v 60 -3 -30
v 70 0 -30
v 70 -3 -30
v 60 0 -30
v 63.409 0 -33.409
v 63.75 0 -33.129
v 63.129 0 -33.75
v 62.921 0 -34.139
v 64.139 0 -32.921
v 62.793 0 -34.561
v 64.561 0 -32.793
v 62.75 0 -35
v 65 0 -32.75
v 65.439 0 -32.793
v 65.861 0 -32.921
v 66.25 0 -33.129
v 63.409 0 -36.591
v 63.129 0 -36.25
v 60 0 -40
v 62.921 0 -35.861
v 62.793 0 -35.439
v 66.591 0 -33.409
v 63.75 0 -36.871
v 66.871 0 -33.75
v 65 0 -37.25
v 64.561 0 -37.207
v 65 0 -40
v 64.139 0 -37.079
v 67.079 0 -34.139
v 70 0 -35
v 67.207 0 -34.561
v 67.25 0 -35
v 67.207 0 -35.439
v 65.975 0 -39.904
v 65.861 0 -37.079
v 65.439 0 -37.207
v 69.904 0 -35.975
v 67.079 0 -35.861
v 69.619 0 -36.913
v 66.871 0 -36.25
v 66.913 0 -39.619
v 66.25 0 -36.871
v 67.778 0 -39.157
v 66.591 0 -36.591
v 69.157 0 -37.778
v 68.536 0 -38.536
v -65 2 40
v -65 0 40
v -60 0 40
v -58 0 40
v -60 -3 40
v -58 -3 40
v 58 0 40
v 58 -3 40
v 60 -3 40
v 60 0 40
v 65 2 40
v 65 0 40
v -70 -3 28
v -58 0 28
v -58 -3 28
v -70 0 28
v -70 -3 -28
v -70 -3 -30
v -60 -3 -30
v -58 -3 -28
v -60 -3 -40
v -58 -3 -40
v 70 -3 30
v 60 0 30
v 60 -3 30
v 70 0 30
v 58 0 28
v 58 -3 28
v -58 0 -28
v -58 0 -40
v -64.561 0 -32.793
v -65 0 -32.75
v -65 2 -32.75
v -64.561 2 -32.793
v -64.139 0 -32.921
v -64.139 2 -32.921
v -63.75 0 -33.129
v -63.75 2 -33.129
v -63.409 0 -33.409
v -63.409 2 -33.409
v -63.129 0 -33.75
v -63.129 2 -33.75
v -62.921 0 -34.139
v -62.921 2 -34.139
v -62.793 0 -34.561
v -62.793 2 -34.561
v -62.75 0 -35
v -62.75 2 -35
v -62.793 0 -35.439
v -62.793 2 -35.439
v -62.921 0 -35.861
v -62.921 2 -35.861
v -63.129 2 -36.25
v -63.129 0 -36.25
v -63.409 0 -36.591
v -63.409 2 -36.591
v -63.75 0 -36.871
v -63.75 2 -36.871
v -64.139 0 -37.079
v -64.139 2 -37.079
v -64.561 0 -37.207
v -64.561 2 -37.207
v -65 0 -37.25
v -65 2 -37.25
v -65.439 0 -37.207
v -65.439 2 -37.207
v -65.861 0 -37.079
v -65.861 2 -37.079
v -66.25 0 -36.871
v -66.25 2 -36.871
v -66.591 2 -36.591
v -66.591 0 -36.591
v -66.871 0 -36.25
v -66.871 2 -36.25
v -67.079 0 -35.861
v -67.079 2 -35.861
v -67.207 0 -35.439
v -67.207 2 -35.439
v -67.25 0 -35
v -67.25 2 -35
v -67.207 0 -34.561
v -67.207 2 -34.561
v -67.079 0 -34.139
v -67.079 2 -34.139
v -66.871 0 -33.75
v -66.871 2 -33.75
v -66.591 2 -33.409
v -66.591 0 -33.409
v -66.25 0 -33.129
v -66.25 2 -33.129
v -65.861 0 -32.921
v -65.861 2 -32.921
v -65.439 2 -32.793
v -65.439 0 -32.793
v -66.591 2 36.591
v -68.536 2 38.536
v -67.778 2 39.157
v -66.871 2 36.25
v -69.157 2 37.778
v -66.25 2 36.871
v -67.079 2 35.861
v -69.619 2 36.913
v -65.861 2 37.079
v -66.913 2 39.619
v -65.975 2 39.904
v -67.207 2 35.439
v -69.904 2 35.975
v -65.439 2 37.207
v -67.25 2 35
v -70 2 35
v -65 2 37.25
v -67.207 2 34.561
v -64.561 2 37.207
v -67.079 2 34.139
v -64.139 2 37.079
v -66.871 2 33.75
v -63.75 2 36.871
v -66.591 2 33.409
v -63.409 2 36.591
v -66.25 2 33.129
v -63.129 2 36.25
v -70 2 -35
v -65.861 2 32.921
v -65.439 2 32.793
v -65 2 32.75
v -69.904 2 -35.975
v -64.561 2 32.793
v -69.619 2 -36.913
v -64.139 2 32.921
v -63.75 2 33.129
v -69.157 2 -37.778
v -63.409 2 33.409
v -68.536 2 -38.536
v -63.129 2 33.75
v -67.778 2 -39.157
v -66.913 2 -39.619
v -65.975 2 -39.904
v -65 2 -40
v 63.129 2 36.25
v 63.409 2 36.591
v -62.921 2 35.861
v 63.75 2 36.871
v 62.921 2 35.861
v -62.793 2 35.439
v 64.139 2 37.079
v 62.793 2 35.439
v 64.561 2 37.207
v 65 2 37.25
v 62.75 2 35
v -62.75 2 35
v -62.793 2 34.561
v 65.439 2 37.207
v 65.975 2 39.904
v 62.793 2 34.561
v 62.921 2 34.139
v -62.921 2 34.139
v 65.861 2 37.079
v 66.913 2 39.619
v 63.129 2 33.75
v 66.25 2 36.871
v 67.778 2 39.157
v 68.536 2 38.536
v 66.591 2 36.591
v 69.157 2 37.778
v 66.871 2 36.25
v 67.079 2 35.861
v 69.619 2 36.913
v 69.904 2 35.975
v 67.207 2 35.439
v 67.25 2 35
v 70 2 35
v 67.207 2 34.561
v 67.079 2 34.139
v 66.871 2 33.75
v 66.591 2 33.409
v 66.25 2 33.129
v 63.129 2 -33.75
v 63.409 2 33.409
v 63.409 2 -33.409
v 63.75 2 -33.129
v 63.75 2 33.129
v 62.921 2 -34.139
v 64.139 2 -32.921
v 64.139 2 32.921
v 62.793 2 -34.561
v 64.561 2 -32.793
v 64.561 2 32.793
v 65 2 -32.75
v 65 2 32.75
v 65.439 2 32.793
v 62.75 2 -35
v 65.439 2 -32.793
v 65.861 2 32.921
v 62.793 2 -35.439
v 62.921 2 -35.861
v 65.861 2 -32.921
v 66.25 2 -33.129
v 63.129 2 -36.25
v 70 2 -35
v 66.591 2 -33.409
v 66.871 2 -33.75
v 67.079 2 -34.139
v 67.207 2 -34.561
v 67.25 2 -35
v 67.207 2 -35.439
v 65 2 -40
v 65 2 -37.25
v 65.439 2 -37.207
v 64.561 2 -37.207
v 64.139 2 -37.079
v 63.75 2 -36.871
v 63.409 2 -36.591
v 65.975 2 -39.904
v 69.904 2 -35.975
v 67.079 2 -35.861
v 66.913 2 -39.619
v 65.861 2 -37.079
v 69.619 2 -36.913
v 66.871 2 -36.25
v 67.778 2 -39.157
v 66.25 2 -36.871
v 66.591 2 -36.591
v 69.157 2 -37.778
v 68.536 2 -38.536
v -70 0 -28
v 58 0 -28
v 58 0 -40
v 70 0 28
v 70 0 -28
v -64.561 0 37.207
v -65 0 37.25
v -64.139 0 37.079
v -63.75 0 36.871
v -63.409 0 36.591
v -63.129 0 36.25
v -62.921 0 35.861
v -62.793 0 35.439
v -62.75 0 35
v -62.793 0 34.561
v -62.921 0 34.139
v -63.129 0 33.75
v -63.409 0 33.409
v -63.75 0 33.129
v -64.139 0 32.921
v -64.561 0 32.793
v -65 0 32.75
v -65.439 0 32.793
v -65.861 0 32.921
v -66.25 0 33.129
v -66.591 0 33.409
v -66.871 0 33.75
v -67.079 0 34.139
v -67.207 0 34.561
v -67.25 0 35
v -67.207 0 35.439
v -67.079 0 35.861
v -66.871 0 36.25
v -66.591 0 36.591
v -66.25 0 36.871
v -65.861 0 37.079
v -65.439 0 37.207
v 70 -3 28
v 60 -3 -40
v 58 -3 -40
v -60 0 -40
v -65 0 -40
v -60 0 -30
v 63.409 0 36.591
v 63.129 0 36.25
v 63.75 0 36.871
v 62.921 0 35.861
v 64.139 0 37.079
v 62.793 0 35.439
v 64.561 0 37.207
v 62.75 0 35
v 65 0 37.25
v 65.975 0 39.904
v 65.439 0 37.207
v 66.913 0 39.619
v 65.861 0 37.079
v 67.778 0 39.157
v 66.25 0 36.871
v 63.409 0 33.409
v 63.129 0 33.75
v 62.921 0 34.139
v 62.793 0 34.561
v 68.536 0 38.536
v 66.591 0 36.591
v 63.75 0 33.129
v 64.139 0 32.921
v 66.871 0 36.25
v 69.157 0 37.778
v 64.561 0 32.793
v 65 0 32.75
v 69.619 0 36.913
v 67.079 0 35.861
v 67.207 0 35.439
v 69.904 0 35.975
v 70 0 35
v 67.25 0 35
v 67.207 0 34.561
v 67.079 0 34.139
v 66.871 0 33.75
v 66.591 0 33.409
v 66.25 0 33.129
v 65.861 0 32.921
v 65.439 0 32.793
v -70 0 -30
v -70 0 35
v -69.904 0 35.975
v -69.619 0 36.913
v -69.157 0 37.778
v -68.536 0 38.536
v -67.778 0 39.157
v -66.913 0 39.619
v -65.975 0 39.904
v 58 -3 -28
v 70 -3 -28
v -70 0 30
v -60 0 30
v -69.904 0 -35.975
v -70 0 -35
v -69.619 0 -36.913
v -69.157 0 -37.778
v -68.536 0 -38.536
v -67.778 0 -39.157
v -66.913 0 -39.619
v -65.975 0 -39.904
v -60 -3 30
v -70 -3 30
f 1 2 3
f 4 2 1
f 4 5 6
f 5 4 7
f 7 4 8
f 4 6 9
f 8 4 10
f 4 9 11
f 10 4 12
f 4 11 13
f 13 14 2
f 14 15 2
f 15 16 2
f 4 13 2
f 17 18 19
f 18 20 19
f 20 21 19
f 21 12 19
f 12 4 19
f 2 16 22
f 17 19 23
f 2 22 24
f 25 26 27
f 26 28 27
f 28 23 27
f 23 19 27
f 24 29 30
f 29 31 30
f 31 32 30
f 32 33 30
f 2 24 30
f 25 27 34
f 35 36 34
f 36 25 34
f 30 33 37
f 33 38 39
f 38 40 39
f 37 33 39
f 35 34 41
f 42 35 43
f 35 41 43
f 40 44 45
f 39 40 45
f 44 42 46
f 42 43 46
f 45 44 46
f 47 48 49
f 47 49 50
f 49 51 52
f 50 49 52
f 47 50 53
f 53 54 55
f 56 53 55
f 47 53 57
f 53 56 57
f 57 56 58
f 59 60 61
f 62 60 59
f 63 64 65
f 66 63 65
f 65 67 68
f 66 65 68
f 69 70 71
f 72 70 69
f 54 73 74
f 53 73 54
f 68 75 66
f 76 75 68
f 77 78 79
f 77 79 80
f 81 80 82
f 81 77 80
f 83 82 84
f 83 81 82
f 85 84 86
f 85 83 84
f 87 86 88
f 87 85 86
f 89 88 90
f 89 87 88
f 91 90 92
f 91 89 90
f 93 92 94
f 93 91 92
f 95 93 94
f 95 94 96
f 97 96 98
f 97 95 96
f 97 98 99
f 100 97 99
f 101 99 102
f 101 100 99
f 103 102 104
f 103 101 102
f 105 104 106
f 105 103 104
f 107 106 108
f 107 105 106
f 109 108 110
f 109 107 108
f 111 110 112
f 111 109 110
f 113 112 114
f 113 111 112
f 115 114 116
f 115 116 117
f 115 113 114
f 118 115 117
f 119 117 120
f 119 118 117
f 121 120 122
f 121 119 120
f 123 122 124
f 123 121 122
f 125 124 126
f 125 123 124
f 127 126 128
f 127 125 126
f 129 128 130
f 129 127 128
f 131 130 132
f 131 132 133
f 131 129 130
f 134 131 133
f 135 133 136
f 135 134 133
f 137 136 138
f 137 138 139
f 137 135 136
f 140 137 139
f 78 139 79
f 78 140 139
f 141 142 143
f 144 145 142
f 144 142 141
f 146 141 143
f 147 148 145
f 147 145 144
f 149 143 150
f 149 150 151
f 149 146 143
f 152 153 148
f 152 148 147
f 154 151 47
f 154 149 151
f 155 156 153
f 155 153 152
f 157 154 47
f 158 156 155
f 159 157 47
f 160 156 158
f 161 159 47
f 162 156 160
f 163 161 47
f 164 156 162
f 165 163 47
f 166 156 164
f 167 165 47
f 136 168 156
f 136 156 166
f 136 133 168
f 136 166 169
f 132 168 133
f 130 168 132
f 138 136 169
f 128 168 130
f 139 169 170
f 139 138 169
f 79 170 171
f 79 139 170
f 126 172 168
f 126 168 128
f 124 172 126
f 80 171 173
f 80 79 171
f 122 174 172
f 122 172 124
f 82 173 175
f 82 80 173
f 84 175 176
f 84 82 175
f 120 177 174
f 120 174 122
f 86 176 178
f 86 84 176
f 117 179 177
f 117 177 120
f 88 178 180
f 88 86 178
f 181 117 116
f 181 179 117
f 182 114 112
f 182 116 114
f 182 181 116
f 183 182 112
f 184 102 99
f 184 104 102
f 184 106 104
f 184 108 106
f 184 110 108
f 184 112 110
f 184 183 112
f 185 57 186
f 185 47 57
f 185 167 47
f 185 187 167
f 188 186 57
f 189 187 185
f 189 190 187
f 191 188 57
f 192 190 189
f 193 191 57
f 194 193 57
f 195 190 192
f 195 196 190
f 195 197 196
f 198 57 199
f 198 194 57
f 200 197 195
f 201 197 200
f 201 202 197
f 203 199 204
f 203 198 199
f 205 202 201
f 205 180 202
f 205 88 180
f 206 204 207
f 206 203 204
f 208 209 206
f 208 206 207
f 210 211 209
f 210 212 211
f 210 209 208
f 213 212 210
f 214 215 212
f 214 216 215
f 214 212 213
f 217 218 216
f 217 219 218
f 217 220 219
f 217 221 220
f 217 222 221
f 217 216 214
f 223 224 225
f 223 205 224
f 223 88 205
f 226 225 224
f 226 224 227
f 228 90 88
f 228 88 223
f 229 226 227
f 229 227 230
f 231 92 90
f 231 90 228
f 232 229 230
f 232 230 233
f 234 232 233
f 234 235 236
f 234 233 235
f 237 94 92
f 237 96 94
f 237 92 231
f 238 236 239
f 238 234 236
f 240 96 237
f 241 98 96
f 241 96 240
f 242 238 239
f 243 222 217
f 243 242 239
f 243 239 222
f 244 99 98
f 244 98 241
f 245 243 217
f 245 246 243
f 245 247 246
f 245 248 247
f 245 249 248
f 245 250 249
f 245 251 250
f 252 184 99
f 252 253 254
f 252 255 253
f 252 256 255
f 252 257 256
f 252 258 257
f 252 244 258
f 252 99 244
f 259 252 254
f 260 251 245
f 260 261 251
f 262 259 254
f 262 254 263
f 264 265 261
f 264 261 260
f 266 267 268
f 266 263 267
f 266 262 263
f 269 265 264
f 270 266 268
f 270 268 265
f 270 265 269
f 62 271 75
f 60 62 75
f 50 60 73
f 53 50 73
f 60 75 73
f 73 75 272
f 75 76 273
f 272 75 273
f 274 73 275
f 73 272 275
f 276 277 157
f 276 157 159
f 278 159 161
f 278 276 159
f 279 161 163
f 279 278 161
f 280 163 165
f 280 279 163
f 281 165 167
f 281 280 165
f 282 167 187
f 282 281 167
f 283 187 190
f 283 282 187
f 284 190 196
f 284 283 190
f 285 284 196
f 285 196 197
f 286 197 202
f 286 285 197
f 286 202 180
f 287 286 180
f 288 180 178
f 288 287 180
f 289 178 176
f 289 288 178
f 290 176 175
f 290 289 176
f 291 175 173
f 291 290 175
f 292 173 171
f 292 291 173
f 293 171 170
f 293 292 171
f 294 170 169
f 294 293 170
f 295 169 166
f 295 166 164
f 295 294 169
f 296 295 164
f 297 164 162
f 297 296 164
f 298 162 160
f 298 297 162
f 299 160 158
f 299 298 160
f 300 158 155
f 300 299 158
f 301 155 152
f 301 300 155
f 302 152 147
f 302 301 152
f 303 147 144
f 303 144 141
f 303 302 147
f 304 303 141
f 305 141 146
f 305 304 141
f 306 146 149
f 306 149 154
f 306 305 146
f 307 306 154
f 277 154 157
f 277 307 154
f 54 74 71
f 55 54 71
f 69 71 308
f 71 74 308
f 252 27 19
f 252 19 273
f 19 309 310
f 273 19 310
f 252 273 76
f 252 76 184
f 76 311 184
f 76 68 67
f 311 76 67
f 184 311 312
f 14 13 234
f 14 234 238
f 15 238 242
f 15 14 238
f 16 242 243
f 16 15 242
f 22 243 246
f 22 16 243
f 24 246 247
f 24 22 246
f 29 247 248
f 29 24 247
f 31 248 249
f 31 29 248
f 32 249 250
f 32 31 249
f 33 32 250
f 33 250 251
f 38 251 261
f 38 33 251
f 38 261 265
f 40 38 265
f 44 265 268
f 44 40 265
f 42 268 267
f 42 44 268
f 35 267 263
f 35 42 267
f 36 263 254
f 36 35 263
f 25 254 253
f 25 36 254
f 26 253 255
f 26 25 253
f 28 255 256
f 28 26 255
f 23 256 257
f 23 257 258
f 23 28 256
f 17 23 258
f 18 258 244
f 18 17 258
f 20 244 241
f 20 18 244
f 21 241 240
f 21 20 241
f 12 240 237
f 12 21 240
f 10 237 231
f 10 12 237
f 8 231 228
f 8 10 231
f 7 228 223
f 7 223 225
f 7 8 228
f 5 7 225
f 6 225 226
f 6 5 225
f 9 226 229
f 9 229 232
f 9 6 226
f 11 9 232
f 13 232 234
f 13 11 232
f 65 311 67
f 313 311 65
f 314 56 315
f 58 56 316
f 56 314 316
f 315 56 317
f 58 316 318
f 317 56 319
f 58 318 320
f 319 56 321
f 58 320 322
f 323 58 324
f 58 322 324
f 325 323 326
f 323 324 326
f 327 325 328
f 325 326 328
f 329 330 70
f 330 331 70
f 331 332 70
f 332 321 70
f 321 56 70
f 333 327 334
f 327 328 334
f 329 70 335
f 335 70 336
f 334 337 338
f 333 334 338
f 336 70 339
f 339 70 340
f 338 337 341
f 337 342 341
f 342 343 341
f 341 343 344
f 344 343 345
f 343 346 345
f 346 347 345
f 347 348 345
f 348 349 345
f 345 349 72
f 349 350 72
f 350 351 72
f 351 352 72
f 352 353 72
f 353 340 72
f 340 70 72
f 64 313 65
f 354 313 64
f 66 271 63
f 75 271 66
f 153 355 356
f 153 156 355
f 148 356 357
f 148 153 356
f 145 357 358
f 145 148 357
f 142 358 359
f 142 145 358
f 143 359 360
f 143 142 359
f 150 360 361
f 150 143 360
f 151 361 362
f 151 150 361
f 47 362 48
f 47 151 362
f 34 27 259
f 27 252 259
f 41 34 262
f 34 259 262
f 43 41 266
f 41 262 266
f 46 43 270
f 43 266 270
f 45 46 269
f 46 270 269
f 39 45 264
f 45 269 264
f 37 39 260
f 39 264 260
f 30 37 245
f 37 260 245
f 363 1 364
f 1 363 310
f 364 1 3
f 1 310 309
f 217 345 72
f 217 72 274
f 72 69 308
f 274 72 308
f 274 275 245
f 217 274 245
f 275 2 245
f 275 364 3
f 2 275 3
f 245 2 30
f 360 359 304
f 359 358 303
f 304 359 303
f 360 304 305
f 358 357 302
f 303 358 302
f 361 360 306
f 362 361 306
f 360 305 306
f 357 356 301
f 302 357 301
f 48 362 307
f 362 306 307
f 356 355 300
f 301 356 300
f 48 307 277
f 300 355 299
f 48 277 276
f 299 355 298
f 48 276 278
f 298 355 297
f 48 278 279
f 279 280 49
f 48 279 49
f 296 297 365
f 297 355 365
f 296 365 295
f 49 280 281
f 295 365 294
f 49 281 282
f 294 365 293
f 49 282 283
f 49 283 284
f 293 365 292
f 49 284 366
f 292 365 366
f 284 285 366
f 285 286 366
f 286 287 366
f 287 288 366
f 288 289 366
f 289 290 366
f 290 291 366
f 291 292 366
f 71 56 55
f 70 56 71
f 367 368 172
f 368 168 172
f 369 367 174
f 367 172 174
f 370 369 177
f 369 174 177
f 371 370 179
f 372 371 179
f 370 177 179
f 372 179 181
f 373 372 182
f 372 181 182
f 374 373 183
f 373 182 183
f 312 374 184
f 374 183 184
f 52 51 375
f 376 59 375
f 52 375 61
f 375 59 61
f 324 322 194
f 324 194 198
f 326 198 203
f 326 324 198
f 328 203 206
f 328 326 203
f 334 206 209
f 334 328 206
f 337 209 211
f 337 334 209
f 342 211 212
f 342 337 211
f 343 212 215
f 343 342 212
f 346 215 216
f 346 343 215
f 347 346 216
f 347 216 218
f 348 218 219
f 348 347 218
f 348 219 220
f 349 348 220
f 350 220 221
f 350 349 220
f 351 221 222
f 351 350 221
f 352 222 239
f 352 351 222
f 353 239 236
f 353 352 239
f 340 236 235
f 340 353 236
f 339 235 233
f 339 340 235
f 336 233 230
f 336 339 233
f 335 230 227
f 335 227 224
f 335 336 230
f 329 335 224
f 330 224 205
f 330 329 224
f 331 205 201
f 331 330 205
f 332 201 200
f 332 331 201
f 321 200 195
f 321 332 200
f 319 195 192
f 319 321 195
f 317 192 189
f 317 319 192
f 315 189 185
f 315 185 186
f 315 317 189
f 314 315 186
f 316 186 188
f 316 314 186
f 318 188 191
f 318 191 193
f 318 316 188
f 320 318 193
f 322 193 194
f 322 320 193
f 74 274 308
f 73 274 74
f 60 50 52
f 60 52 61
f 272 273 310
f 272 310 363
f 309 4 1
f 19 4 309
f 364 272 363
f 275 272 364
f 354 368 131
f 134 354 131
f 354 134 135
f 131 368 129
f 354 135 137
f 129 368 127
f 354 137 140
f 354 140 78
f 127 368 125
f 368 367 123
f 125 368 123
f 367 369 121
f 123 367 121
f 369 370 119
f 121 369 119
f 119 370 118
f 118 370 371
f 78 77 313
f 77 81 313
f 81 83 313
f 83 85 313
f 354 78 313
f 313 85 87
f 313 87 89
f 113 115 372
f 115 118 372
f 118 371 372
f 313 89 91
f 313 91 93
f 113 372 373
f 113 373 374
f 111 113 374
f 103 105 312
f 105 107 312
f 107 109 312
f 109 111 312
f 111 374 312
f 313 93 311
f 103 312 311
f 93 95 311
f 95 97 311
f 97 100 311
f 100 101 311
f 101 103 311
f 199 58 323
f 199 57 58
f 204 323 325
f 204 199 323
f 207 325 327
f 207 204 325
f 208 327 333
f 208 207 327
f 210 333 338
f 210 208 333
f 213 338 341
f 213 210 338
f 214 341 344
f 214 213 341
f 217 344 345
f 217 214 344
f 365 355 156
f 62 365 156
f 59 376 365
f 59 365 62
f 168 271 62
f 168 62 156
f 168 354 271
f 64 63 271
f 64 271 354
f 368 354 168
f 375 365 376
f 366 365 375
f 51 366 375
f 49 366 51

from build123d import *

# Parameters (mm, degrees)
SKETCH1_W           = 140
SKETCH1_H           = 80
SKETCH1_R           = 2.25
BOSS_EXTRUDE4_DEPTH = 2
BOSS_EXTRUDE5_DEPTH = 3
FILLET1_R           = 5


with BuildPart() as part:
    # Sketch1 → Boss-Extrude4 (new body)
    with BuildSketch(Plane(origin=(0, 0, 0), x_dir=(1, 0, 0), z_dir=(0, 1, 0))):
        Rectangle(SKETCH1_W, SKETCH1_H)
        with Locations((65, 35)):
            Circle(SKETCH1_R, mode=Mode.SUBTRACT)
        with Locations((65, -35)):
            Circle(SKETCH1_R, mode=Mode.SUBTRACT)
        with Locations((-65, -35)):
            Circle(SKETCH1_R, mode=Mode.SUBTRACT)
        with Locations((-65, 35)):
            Circle(SKETCH1_R, mode=Mode.SUBTRACT)
    extrude(amount=BOSS_EXTRUDE4_DEPTH)

    # Sketch1<5> → Boss-Extrude5 (add)
    with BuildSketch(Plane(origin=(0, 0, 0), x_dir=(1, 0, 0), z_dir=(0, 1, 0))):
        Polygon((70, 28), (70, 30), (60, 30), (60, 40), (58, 40), (58, 28), align=None)
        Polygon((70, -30), (70, -28), (58, -28), (58, -40), (60, -40), (60, -30), align=None)
        Polygon((-58, 28), (-58, 40), (-60, 40), (-60, 30), (-70, 30), (-70, 28), align=None)
        Polygon((-60, -40), (-58, -40), (-58, -28), (-70, -28), (-70, -30), (-60, -30), align=None)
    extrude(amount=-BOSS_EXTRUDE5_DEPTH)

    # Fillet1
    fillet1_edges = [part.edges().sort_by_distance(p)[0] for p in [
        (70, 1, -40),
        (-70, 1, -40),
        (-70, 1, 40),
        (70, 1, 40),
    ]]
    fillet(fillet1_edges, radius=FILLET1_R)


solid = part.part
